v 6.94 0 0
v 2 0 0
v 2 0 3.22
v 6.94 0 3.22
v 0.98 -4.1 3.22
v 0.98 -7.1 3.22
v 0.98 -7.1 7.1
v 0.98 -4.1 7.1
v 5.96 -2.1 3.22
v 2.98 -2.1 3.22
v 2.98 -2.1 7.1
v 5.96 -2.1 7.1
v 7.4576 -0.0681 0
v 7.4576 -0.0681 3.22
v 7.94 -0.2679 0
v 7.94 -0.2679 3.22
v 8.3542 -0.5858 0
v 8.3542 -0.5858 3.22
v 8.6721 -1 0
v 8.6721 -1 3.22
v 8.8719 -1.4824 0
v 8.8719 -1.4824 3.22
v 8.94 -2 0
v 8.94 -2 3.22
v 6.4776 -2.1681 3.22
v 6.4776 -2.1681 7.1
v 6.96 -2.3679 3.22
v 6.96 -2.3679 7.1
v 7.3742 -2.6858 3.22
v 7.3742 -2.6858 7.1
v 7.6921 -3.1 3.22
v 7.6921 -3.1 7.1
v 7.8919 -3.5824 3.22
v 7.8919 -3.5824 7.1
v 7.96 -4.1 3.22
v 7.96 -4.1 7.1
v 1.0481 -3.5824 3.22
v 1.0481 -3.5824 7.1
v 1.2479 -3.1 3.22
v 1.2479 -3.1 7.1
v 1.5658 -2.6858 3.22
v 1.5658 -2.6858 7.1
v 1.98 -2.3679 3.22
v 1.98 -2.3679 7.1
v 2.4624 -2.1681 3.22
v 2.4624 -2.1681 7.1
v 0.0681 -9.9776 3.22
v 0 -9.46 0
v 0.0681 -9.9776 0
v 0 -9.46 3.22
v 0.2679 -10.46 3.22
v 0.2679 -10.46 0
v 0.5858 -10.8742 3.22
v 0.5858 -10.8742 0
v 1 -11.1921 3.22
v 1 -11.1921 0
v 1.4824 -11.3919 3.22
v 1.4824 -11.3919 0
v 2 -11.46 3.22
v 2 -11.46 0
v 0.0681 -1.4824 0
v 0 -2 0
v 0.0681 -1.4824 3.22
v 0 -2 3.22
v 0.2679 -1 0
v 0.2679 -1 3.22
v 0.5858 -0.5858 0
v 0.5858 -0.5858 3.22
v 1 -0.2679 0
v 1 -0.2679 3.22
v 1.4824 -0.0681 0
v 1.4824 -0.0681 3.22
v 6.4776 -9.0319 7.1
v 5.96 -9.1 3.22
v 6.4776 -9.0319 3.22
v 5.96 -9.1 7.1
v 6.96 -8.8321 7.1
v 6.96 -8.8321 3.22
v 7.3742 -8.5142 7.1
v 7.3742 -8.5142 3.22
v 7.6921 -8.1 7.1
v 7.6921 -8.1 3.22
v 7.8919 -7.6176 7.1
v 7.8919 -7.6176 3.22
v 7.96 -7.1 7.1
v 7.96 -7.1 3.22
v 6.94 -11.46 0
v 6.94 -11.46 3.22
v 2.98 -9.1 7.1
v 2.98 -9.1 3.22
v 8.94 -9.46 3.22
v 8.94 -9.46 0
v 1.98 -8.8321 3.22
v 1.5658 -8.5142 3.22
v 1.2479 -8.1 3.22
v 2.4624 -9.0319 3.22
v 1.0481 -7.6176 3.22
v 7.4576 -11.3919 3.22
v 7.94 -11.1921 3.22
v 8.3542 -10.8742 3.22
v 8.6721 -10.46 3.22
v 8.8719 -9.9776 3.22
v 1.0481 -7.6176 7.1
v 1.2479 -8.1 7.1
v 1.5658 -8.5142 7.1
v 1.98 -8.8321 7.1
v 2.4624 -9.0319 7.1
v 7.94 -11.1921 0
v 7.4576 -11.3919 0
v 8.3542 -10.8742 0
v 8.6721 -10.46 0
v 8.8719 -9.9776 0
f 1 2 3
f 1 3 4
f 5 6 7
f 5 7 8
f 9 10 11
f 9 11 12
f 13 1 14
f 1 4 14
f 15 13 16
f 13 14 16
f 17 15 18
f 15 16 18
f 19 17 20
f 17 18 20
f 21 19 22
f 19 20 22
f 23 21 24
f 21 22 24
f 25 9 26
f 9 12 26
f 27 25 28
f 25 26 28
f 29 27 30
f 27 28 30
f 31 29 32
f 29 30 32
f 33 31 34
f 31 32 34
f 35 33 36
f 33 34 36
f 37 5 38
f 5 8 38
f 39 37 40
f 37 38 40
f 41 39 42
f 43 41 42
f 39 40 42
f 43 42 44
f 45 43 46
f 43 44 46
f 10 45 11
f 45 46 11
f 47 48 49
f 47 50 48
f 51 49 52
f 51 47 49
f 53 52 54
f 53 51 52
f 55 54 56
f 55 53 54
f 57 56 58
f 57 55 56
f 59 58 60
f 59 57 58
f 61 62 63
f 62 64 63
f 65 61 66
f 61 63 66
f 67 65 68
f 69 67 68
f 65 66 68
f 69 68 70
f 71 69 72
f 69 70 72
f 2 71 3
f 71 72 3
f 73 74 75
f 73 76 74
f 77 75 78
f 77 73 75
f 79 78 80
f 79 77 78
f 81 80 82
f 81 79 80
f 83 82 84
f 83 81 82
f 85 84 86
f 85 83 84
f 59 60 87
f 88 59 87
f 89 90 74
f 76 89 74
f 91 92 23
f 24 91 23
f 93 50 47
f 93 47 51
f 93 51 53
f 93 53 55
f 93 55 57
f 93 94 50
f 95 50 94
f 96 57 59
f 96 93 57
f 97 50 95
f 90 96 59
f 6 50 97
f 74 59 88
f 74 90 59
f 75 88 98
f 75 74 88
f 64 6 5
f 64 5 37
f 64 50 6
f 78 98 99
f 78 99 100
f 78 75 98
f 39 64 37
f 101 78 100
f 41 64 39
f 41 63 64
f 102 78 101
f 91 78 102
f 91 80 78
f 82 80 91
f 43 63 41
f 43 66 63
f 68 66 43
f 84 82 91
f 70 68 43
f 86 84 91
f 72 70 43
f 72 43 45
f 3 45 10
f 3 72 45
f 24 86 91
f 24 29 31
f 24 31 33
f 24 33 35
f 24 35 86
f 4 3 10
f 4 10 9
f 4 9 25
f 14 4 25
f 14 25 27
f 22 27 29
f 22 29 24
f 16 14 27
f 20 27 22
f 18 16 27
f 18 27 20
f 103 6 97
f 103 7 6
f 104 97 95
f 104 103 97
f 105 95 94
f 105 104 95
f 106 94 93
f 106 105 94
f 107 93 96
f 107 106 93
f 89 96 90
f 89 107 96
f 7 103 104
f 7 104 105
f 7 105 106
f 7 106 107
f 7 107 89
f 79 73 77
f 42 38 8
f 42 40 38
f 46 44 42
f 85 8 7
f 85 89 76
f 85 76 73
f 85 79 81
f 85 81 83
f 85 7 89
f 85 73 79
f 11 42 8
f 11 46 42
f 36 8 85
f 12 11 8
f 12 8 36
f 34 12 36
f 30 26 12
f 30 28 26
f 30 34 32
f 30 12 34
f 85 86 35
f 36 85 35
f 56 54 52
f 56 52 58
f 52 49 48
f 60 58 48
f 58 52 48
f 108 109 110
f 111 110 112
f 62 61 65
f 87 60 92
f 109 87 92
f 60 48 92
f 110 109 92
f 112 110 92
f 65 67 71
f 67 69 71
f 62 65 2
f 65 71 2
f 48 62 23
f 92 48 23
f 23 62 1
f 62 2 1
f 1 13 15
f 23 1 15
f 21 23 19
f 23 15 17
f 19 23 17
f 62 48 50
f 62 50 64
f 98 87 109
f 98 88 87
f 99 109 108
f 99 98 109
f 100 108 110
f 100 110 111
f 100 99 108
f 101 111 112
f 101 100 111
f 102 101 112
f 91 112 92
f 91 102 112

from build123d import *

# Parameters (mm, degrees)
F0_W     = 8.94
F0_H     = 11.46
F0_W_2   = 6.98
F0_H_2   = 7
F1_DEPTH = 3.22
F2_DEPTH = 7.1
F3_R     = 2


with BuildPart() as f1:
    # F0 (on Top) → F1 (new body)
    with BuildSketch(Plane.XY):
        with Locations((4.47, -5.73)):
            Rectangle(F0_W, F0_H)
        with Locations((4.47, -5.6)):
            Rectangle(F0_W_2, F0_H_2, mode=Mode.SUBTRACT)
    extrude(amount=F1_DEPTH)

    # F0 (on Top) → F2 (join)
    with BuildSketch(Plane.XY):
        with Locations((4.47, -5.6)):
            Rectangle(F0_W_2, F0_H_2)
    extrude(amount=F2_DEPTH)

    # F3
    f3_edges = [f1.edges().sort_by_distance(p)[0] for p in [
        (0.98, -9.1, 5.16),
        (7.96, -9.1, 5.16),
        (7.96, -2.1, 5.16),
        (0.98, -2.1, 5.16),
        (8.94, -11.46, 1.61),
        (8.94, 0, 1.61),
        (0, 0, 1.61),
        (0, -11.46, 1.61),
    ]]
    fillet(f3_edges, radius=F3_R)


solid = f1.part
